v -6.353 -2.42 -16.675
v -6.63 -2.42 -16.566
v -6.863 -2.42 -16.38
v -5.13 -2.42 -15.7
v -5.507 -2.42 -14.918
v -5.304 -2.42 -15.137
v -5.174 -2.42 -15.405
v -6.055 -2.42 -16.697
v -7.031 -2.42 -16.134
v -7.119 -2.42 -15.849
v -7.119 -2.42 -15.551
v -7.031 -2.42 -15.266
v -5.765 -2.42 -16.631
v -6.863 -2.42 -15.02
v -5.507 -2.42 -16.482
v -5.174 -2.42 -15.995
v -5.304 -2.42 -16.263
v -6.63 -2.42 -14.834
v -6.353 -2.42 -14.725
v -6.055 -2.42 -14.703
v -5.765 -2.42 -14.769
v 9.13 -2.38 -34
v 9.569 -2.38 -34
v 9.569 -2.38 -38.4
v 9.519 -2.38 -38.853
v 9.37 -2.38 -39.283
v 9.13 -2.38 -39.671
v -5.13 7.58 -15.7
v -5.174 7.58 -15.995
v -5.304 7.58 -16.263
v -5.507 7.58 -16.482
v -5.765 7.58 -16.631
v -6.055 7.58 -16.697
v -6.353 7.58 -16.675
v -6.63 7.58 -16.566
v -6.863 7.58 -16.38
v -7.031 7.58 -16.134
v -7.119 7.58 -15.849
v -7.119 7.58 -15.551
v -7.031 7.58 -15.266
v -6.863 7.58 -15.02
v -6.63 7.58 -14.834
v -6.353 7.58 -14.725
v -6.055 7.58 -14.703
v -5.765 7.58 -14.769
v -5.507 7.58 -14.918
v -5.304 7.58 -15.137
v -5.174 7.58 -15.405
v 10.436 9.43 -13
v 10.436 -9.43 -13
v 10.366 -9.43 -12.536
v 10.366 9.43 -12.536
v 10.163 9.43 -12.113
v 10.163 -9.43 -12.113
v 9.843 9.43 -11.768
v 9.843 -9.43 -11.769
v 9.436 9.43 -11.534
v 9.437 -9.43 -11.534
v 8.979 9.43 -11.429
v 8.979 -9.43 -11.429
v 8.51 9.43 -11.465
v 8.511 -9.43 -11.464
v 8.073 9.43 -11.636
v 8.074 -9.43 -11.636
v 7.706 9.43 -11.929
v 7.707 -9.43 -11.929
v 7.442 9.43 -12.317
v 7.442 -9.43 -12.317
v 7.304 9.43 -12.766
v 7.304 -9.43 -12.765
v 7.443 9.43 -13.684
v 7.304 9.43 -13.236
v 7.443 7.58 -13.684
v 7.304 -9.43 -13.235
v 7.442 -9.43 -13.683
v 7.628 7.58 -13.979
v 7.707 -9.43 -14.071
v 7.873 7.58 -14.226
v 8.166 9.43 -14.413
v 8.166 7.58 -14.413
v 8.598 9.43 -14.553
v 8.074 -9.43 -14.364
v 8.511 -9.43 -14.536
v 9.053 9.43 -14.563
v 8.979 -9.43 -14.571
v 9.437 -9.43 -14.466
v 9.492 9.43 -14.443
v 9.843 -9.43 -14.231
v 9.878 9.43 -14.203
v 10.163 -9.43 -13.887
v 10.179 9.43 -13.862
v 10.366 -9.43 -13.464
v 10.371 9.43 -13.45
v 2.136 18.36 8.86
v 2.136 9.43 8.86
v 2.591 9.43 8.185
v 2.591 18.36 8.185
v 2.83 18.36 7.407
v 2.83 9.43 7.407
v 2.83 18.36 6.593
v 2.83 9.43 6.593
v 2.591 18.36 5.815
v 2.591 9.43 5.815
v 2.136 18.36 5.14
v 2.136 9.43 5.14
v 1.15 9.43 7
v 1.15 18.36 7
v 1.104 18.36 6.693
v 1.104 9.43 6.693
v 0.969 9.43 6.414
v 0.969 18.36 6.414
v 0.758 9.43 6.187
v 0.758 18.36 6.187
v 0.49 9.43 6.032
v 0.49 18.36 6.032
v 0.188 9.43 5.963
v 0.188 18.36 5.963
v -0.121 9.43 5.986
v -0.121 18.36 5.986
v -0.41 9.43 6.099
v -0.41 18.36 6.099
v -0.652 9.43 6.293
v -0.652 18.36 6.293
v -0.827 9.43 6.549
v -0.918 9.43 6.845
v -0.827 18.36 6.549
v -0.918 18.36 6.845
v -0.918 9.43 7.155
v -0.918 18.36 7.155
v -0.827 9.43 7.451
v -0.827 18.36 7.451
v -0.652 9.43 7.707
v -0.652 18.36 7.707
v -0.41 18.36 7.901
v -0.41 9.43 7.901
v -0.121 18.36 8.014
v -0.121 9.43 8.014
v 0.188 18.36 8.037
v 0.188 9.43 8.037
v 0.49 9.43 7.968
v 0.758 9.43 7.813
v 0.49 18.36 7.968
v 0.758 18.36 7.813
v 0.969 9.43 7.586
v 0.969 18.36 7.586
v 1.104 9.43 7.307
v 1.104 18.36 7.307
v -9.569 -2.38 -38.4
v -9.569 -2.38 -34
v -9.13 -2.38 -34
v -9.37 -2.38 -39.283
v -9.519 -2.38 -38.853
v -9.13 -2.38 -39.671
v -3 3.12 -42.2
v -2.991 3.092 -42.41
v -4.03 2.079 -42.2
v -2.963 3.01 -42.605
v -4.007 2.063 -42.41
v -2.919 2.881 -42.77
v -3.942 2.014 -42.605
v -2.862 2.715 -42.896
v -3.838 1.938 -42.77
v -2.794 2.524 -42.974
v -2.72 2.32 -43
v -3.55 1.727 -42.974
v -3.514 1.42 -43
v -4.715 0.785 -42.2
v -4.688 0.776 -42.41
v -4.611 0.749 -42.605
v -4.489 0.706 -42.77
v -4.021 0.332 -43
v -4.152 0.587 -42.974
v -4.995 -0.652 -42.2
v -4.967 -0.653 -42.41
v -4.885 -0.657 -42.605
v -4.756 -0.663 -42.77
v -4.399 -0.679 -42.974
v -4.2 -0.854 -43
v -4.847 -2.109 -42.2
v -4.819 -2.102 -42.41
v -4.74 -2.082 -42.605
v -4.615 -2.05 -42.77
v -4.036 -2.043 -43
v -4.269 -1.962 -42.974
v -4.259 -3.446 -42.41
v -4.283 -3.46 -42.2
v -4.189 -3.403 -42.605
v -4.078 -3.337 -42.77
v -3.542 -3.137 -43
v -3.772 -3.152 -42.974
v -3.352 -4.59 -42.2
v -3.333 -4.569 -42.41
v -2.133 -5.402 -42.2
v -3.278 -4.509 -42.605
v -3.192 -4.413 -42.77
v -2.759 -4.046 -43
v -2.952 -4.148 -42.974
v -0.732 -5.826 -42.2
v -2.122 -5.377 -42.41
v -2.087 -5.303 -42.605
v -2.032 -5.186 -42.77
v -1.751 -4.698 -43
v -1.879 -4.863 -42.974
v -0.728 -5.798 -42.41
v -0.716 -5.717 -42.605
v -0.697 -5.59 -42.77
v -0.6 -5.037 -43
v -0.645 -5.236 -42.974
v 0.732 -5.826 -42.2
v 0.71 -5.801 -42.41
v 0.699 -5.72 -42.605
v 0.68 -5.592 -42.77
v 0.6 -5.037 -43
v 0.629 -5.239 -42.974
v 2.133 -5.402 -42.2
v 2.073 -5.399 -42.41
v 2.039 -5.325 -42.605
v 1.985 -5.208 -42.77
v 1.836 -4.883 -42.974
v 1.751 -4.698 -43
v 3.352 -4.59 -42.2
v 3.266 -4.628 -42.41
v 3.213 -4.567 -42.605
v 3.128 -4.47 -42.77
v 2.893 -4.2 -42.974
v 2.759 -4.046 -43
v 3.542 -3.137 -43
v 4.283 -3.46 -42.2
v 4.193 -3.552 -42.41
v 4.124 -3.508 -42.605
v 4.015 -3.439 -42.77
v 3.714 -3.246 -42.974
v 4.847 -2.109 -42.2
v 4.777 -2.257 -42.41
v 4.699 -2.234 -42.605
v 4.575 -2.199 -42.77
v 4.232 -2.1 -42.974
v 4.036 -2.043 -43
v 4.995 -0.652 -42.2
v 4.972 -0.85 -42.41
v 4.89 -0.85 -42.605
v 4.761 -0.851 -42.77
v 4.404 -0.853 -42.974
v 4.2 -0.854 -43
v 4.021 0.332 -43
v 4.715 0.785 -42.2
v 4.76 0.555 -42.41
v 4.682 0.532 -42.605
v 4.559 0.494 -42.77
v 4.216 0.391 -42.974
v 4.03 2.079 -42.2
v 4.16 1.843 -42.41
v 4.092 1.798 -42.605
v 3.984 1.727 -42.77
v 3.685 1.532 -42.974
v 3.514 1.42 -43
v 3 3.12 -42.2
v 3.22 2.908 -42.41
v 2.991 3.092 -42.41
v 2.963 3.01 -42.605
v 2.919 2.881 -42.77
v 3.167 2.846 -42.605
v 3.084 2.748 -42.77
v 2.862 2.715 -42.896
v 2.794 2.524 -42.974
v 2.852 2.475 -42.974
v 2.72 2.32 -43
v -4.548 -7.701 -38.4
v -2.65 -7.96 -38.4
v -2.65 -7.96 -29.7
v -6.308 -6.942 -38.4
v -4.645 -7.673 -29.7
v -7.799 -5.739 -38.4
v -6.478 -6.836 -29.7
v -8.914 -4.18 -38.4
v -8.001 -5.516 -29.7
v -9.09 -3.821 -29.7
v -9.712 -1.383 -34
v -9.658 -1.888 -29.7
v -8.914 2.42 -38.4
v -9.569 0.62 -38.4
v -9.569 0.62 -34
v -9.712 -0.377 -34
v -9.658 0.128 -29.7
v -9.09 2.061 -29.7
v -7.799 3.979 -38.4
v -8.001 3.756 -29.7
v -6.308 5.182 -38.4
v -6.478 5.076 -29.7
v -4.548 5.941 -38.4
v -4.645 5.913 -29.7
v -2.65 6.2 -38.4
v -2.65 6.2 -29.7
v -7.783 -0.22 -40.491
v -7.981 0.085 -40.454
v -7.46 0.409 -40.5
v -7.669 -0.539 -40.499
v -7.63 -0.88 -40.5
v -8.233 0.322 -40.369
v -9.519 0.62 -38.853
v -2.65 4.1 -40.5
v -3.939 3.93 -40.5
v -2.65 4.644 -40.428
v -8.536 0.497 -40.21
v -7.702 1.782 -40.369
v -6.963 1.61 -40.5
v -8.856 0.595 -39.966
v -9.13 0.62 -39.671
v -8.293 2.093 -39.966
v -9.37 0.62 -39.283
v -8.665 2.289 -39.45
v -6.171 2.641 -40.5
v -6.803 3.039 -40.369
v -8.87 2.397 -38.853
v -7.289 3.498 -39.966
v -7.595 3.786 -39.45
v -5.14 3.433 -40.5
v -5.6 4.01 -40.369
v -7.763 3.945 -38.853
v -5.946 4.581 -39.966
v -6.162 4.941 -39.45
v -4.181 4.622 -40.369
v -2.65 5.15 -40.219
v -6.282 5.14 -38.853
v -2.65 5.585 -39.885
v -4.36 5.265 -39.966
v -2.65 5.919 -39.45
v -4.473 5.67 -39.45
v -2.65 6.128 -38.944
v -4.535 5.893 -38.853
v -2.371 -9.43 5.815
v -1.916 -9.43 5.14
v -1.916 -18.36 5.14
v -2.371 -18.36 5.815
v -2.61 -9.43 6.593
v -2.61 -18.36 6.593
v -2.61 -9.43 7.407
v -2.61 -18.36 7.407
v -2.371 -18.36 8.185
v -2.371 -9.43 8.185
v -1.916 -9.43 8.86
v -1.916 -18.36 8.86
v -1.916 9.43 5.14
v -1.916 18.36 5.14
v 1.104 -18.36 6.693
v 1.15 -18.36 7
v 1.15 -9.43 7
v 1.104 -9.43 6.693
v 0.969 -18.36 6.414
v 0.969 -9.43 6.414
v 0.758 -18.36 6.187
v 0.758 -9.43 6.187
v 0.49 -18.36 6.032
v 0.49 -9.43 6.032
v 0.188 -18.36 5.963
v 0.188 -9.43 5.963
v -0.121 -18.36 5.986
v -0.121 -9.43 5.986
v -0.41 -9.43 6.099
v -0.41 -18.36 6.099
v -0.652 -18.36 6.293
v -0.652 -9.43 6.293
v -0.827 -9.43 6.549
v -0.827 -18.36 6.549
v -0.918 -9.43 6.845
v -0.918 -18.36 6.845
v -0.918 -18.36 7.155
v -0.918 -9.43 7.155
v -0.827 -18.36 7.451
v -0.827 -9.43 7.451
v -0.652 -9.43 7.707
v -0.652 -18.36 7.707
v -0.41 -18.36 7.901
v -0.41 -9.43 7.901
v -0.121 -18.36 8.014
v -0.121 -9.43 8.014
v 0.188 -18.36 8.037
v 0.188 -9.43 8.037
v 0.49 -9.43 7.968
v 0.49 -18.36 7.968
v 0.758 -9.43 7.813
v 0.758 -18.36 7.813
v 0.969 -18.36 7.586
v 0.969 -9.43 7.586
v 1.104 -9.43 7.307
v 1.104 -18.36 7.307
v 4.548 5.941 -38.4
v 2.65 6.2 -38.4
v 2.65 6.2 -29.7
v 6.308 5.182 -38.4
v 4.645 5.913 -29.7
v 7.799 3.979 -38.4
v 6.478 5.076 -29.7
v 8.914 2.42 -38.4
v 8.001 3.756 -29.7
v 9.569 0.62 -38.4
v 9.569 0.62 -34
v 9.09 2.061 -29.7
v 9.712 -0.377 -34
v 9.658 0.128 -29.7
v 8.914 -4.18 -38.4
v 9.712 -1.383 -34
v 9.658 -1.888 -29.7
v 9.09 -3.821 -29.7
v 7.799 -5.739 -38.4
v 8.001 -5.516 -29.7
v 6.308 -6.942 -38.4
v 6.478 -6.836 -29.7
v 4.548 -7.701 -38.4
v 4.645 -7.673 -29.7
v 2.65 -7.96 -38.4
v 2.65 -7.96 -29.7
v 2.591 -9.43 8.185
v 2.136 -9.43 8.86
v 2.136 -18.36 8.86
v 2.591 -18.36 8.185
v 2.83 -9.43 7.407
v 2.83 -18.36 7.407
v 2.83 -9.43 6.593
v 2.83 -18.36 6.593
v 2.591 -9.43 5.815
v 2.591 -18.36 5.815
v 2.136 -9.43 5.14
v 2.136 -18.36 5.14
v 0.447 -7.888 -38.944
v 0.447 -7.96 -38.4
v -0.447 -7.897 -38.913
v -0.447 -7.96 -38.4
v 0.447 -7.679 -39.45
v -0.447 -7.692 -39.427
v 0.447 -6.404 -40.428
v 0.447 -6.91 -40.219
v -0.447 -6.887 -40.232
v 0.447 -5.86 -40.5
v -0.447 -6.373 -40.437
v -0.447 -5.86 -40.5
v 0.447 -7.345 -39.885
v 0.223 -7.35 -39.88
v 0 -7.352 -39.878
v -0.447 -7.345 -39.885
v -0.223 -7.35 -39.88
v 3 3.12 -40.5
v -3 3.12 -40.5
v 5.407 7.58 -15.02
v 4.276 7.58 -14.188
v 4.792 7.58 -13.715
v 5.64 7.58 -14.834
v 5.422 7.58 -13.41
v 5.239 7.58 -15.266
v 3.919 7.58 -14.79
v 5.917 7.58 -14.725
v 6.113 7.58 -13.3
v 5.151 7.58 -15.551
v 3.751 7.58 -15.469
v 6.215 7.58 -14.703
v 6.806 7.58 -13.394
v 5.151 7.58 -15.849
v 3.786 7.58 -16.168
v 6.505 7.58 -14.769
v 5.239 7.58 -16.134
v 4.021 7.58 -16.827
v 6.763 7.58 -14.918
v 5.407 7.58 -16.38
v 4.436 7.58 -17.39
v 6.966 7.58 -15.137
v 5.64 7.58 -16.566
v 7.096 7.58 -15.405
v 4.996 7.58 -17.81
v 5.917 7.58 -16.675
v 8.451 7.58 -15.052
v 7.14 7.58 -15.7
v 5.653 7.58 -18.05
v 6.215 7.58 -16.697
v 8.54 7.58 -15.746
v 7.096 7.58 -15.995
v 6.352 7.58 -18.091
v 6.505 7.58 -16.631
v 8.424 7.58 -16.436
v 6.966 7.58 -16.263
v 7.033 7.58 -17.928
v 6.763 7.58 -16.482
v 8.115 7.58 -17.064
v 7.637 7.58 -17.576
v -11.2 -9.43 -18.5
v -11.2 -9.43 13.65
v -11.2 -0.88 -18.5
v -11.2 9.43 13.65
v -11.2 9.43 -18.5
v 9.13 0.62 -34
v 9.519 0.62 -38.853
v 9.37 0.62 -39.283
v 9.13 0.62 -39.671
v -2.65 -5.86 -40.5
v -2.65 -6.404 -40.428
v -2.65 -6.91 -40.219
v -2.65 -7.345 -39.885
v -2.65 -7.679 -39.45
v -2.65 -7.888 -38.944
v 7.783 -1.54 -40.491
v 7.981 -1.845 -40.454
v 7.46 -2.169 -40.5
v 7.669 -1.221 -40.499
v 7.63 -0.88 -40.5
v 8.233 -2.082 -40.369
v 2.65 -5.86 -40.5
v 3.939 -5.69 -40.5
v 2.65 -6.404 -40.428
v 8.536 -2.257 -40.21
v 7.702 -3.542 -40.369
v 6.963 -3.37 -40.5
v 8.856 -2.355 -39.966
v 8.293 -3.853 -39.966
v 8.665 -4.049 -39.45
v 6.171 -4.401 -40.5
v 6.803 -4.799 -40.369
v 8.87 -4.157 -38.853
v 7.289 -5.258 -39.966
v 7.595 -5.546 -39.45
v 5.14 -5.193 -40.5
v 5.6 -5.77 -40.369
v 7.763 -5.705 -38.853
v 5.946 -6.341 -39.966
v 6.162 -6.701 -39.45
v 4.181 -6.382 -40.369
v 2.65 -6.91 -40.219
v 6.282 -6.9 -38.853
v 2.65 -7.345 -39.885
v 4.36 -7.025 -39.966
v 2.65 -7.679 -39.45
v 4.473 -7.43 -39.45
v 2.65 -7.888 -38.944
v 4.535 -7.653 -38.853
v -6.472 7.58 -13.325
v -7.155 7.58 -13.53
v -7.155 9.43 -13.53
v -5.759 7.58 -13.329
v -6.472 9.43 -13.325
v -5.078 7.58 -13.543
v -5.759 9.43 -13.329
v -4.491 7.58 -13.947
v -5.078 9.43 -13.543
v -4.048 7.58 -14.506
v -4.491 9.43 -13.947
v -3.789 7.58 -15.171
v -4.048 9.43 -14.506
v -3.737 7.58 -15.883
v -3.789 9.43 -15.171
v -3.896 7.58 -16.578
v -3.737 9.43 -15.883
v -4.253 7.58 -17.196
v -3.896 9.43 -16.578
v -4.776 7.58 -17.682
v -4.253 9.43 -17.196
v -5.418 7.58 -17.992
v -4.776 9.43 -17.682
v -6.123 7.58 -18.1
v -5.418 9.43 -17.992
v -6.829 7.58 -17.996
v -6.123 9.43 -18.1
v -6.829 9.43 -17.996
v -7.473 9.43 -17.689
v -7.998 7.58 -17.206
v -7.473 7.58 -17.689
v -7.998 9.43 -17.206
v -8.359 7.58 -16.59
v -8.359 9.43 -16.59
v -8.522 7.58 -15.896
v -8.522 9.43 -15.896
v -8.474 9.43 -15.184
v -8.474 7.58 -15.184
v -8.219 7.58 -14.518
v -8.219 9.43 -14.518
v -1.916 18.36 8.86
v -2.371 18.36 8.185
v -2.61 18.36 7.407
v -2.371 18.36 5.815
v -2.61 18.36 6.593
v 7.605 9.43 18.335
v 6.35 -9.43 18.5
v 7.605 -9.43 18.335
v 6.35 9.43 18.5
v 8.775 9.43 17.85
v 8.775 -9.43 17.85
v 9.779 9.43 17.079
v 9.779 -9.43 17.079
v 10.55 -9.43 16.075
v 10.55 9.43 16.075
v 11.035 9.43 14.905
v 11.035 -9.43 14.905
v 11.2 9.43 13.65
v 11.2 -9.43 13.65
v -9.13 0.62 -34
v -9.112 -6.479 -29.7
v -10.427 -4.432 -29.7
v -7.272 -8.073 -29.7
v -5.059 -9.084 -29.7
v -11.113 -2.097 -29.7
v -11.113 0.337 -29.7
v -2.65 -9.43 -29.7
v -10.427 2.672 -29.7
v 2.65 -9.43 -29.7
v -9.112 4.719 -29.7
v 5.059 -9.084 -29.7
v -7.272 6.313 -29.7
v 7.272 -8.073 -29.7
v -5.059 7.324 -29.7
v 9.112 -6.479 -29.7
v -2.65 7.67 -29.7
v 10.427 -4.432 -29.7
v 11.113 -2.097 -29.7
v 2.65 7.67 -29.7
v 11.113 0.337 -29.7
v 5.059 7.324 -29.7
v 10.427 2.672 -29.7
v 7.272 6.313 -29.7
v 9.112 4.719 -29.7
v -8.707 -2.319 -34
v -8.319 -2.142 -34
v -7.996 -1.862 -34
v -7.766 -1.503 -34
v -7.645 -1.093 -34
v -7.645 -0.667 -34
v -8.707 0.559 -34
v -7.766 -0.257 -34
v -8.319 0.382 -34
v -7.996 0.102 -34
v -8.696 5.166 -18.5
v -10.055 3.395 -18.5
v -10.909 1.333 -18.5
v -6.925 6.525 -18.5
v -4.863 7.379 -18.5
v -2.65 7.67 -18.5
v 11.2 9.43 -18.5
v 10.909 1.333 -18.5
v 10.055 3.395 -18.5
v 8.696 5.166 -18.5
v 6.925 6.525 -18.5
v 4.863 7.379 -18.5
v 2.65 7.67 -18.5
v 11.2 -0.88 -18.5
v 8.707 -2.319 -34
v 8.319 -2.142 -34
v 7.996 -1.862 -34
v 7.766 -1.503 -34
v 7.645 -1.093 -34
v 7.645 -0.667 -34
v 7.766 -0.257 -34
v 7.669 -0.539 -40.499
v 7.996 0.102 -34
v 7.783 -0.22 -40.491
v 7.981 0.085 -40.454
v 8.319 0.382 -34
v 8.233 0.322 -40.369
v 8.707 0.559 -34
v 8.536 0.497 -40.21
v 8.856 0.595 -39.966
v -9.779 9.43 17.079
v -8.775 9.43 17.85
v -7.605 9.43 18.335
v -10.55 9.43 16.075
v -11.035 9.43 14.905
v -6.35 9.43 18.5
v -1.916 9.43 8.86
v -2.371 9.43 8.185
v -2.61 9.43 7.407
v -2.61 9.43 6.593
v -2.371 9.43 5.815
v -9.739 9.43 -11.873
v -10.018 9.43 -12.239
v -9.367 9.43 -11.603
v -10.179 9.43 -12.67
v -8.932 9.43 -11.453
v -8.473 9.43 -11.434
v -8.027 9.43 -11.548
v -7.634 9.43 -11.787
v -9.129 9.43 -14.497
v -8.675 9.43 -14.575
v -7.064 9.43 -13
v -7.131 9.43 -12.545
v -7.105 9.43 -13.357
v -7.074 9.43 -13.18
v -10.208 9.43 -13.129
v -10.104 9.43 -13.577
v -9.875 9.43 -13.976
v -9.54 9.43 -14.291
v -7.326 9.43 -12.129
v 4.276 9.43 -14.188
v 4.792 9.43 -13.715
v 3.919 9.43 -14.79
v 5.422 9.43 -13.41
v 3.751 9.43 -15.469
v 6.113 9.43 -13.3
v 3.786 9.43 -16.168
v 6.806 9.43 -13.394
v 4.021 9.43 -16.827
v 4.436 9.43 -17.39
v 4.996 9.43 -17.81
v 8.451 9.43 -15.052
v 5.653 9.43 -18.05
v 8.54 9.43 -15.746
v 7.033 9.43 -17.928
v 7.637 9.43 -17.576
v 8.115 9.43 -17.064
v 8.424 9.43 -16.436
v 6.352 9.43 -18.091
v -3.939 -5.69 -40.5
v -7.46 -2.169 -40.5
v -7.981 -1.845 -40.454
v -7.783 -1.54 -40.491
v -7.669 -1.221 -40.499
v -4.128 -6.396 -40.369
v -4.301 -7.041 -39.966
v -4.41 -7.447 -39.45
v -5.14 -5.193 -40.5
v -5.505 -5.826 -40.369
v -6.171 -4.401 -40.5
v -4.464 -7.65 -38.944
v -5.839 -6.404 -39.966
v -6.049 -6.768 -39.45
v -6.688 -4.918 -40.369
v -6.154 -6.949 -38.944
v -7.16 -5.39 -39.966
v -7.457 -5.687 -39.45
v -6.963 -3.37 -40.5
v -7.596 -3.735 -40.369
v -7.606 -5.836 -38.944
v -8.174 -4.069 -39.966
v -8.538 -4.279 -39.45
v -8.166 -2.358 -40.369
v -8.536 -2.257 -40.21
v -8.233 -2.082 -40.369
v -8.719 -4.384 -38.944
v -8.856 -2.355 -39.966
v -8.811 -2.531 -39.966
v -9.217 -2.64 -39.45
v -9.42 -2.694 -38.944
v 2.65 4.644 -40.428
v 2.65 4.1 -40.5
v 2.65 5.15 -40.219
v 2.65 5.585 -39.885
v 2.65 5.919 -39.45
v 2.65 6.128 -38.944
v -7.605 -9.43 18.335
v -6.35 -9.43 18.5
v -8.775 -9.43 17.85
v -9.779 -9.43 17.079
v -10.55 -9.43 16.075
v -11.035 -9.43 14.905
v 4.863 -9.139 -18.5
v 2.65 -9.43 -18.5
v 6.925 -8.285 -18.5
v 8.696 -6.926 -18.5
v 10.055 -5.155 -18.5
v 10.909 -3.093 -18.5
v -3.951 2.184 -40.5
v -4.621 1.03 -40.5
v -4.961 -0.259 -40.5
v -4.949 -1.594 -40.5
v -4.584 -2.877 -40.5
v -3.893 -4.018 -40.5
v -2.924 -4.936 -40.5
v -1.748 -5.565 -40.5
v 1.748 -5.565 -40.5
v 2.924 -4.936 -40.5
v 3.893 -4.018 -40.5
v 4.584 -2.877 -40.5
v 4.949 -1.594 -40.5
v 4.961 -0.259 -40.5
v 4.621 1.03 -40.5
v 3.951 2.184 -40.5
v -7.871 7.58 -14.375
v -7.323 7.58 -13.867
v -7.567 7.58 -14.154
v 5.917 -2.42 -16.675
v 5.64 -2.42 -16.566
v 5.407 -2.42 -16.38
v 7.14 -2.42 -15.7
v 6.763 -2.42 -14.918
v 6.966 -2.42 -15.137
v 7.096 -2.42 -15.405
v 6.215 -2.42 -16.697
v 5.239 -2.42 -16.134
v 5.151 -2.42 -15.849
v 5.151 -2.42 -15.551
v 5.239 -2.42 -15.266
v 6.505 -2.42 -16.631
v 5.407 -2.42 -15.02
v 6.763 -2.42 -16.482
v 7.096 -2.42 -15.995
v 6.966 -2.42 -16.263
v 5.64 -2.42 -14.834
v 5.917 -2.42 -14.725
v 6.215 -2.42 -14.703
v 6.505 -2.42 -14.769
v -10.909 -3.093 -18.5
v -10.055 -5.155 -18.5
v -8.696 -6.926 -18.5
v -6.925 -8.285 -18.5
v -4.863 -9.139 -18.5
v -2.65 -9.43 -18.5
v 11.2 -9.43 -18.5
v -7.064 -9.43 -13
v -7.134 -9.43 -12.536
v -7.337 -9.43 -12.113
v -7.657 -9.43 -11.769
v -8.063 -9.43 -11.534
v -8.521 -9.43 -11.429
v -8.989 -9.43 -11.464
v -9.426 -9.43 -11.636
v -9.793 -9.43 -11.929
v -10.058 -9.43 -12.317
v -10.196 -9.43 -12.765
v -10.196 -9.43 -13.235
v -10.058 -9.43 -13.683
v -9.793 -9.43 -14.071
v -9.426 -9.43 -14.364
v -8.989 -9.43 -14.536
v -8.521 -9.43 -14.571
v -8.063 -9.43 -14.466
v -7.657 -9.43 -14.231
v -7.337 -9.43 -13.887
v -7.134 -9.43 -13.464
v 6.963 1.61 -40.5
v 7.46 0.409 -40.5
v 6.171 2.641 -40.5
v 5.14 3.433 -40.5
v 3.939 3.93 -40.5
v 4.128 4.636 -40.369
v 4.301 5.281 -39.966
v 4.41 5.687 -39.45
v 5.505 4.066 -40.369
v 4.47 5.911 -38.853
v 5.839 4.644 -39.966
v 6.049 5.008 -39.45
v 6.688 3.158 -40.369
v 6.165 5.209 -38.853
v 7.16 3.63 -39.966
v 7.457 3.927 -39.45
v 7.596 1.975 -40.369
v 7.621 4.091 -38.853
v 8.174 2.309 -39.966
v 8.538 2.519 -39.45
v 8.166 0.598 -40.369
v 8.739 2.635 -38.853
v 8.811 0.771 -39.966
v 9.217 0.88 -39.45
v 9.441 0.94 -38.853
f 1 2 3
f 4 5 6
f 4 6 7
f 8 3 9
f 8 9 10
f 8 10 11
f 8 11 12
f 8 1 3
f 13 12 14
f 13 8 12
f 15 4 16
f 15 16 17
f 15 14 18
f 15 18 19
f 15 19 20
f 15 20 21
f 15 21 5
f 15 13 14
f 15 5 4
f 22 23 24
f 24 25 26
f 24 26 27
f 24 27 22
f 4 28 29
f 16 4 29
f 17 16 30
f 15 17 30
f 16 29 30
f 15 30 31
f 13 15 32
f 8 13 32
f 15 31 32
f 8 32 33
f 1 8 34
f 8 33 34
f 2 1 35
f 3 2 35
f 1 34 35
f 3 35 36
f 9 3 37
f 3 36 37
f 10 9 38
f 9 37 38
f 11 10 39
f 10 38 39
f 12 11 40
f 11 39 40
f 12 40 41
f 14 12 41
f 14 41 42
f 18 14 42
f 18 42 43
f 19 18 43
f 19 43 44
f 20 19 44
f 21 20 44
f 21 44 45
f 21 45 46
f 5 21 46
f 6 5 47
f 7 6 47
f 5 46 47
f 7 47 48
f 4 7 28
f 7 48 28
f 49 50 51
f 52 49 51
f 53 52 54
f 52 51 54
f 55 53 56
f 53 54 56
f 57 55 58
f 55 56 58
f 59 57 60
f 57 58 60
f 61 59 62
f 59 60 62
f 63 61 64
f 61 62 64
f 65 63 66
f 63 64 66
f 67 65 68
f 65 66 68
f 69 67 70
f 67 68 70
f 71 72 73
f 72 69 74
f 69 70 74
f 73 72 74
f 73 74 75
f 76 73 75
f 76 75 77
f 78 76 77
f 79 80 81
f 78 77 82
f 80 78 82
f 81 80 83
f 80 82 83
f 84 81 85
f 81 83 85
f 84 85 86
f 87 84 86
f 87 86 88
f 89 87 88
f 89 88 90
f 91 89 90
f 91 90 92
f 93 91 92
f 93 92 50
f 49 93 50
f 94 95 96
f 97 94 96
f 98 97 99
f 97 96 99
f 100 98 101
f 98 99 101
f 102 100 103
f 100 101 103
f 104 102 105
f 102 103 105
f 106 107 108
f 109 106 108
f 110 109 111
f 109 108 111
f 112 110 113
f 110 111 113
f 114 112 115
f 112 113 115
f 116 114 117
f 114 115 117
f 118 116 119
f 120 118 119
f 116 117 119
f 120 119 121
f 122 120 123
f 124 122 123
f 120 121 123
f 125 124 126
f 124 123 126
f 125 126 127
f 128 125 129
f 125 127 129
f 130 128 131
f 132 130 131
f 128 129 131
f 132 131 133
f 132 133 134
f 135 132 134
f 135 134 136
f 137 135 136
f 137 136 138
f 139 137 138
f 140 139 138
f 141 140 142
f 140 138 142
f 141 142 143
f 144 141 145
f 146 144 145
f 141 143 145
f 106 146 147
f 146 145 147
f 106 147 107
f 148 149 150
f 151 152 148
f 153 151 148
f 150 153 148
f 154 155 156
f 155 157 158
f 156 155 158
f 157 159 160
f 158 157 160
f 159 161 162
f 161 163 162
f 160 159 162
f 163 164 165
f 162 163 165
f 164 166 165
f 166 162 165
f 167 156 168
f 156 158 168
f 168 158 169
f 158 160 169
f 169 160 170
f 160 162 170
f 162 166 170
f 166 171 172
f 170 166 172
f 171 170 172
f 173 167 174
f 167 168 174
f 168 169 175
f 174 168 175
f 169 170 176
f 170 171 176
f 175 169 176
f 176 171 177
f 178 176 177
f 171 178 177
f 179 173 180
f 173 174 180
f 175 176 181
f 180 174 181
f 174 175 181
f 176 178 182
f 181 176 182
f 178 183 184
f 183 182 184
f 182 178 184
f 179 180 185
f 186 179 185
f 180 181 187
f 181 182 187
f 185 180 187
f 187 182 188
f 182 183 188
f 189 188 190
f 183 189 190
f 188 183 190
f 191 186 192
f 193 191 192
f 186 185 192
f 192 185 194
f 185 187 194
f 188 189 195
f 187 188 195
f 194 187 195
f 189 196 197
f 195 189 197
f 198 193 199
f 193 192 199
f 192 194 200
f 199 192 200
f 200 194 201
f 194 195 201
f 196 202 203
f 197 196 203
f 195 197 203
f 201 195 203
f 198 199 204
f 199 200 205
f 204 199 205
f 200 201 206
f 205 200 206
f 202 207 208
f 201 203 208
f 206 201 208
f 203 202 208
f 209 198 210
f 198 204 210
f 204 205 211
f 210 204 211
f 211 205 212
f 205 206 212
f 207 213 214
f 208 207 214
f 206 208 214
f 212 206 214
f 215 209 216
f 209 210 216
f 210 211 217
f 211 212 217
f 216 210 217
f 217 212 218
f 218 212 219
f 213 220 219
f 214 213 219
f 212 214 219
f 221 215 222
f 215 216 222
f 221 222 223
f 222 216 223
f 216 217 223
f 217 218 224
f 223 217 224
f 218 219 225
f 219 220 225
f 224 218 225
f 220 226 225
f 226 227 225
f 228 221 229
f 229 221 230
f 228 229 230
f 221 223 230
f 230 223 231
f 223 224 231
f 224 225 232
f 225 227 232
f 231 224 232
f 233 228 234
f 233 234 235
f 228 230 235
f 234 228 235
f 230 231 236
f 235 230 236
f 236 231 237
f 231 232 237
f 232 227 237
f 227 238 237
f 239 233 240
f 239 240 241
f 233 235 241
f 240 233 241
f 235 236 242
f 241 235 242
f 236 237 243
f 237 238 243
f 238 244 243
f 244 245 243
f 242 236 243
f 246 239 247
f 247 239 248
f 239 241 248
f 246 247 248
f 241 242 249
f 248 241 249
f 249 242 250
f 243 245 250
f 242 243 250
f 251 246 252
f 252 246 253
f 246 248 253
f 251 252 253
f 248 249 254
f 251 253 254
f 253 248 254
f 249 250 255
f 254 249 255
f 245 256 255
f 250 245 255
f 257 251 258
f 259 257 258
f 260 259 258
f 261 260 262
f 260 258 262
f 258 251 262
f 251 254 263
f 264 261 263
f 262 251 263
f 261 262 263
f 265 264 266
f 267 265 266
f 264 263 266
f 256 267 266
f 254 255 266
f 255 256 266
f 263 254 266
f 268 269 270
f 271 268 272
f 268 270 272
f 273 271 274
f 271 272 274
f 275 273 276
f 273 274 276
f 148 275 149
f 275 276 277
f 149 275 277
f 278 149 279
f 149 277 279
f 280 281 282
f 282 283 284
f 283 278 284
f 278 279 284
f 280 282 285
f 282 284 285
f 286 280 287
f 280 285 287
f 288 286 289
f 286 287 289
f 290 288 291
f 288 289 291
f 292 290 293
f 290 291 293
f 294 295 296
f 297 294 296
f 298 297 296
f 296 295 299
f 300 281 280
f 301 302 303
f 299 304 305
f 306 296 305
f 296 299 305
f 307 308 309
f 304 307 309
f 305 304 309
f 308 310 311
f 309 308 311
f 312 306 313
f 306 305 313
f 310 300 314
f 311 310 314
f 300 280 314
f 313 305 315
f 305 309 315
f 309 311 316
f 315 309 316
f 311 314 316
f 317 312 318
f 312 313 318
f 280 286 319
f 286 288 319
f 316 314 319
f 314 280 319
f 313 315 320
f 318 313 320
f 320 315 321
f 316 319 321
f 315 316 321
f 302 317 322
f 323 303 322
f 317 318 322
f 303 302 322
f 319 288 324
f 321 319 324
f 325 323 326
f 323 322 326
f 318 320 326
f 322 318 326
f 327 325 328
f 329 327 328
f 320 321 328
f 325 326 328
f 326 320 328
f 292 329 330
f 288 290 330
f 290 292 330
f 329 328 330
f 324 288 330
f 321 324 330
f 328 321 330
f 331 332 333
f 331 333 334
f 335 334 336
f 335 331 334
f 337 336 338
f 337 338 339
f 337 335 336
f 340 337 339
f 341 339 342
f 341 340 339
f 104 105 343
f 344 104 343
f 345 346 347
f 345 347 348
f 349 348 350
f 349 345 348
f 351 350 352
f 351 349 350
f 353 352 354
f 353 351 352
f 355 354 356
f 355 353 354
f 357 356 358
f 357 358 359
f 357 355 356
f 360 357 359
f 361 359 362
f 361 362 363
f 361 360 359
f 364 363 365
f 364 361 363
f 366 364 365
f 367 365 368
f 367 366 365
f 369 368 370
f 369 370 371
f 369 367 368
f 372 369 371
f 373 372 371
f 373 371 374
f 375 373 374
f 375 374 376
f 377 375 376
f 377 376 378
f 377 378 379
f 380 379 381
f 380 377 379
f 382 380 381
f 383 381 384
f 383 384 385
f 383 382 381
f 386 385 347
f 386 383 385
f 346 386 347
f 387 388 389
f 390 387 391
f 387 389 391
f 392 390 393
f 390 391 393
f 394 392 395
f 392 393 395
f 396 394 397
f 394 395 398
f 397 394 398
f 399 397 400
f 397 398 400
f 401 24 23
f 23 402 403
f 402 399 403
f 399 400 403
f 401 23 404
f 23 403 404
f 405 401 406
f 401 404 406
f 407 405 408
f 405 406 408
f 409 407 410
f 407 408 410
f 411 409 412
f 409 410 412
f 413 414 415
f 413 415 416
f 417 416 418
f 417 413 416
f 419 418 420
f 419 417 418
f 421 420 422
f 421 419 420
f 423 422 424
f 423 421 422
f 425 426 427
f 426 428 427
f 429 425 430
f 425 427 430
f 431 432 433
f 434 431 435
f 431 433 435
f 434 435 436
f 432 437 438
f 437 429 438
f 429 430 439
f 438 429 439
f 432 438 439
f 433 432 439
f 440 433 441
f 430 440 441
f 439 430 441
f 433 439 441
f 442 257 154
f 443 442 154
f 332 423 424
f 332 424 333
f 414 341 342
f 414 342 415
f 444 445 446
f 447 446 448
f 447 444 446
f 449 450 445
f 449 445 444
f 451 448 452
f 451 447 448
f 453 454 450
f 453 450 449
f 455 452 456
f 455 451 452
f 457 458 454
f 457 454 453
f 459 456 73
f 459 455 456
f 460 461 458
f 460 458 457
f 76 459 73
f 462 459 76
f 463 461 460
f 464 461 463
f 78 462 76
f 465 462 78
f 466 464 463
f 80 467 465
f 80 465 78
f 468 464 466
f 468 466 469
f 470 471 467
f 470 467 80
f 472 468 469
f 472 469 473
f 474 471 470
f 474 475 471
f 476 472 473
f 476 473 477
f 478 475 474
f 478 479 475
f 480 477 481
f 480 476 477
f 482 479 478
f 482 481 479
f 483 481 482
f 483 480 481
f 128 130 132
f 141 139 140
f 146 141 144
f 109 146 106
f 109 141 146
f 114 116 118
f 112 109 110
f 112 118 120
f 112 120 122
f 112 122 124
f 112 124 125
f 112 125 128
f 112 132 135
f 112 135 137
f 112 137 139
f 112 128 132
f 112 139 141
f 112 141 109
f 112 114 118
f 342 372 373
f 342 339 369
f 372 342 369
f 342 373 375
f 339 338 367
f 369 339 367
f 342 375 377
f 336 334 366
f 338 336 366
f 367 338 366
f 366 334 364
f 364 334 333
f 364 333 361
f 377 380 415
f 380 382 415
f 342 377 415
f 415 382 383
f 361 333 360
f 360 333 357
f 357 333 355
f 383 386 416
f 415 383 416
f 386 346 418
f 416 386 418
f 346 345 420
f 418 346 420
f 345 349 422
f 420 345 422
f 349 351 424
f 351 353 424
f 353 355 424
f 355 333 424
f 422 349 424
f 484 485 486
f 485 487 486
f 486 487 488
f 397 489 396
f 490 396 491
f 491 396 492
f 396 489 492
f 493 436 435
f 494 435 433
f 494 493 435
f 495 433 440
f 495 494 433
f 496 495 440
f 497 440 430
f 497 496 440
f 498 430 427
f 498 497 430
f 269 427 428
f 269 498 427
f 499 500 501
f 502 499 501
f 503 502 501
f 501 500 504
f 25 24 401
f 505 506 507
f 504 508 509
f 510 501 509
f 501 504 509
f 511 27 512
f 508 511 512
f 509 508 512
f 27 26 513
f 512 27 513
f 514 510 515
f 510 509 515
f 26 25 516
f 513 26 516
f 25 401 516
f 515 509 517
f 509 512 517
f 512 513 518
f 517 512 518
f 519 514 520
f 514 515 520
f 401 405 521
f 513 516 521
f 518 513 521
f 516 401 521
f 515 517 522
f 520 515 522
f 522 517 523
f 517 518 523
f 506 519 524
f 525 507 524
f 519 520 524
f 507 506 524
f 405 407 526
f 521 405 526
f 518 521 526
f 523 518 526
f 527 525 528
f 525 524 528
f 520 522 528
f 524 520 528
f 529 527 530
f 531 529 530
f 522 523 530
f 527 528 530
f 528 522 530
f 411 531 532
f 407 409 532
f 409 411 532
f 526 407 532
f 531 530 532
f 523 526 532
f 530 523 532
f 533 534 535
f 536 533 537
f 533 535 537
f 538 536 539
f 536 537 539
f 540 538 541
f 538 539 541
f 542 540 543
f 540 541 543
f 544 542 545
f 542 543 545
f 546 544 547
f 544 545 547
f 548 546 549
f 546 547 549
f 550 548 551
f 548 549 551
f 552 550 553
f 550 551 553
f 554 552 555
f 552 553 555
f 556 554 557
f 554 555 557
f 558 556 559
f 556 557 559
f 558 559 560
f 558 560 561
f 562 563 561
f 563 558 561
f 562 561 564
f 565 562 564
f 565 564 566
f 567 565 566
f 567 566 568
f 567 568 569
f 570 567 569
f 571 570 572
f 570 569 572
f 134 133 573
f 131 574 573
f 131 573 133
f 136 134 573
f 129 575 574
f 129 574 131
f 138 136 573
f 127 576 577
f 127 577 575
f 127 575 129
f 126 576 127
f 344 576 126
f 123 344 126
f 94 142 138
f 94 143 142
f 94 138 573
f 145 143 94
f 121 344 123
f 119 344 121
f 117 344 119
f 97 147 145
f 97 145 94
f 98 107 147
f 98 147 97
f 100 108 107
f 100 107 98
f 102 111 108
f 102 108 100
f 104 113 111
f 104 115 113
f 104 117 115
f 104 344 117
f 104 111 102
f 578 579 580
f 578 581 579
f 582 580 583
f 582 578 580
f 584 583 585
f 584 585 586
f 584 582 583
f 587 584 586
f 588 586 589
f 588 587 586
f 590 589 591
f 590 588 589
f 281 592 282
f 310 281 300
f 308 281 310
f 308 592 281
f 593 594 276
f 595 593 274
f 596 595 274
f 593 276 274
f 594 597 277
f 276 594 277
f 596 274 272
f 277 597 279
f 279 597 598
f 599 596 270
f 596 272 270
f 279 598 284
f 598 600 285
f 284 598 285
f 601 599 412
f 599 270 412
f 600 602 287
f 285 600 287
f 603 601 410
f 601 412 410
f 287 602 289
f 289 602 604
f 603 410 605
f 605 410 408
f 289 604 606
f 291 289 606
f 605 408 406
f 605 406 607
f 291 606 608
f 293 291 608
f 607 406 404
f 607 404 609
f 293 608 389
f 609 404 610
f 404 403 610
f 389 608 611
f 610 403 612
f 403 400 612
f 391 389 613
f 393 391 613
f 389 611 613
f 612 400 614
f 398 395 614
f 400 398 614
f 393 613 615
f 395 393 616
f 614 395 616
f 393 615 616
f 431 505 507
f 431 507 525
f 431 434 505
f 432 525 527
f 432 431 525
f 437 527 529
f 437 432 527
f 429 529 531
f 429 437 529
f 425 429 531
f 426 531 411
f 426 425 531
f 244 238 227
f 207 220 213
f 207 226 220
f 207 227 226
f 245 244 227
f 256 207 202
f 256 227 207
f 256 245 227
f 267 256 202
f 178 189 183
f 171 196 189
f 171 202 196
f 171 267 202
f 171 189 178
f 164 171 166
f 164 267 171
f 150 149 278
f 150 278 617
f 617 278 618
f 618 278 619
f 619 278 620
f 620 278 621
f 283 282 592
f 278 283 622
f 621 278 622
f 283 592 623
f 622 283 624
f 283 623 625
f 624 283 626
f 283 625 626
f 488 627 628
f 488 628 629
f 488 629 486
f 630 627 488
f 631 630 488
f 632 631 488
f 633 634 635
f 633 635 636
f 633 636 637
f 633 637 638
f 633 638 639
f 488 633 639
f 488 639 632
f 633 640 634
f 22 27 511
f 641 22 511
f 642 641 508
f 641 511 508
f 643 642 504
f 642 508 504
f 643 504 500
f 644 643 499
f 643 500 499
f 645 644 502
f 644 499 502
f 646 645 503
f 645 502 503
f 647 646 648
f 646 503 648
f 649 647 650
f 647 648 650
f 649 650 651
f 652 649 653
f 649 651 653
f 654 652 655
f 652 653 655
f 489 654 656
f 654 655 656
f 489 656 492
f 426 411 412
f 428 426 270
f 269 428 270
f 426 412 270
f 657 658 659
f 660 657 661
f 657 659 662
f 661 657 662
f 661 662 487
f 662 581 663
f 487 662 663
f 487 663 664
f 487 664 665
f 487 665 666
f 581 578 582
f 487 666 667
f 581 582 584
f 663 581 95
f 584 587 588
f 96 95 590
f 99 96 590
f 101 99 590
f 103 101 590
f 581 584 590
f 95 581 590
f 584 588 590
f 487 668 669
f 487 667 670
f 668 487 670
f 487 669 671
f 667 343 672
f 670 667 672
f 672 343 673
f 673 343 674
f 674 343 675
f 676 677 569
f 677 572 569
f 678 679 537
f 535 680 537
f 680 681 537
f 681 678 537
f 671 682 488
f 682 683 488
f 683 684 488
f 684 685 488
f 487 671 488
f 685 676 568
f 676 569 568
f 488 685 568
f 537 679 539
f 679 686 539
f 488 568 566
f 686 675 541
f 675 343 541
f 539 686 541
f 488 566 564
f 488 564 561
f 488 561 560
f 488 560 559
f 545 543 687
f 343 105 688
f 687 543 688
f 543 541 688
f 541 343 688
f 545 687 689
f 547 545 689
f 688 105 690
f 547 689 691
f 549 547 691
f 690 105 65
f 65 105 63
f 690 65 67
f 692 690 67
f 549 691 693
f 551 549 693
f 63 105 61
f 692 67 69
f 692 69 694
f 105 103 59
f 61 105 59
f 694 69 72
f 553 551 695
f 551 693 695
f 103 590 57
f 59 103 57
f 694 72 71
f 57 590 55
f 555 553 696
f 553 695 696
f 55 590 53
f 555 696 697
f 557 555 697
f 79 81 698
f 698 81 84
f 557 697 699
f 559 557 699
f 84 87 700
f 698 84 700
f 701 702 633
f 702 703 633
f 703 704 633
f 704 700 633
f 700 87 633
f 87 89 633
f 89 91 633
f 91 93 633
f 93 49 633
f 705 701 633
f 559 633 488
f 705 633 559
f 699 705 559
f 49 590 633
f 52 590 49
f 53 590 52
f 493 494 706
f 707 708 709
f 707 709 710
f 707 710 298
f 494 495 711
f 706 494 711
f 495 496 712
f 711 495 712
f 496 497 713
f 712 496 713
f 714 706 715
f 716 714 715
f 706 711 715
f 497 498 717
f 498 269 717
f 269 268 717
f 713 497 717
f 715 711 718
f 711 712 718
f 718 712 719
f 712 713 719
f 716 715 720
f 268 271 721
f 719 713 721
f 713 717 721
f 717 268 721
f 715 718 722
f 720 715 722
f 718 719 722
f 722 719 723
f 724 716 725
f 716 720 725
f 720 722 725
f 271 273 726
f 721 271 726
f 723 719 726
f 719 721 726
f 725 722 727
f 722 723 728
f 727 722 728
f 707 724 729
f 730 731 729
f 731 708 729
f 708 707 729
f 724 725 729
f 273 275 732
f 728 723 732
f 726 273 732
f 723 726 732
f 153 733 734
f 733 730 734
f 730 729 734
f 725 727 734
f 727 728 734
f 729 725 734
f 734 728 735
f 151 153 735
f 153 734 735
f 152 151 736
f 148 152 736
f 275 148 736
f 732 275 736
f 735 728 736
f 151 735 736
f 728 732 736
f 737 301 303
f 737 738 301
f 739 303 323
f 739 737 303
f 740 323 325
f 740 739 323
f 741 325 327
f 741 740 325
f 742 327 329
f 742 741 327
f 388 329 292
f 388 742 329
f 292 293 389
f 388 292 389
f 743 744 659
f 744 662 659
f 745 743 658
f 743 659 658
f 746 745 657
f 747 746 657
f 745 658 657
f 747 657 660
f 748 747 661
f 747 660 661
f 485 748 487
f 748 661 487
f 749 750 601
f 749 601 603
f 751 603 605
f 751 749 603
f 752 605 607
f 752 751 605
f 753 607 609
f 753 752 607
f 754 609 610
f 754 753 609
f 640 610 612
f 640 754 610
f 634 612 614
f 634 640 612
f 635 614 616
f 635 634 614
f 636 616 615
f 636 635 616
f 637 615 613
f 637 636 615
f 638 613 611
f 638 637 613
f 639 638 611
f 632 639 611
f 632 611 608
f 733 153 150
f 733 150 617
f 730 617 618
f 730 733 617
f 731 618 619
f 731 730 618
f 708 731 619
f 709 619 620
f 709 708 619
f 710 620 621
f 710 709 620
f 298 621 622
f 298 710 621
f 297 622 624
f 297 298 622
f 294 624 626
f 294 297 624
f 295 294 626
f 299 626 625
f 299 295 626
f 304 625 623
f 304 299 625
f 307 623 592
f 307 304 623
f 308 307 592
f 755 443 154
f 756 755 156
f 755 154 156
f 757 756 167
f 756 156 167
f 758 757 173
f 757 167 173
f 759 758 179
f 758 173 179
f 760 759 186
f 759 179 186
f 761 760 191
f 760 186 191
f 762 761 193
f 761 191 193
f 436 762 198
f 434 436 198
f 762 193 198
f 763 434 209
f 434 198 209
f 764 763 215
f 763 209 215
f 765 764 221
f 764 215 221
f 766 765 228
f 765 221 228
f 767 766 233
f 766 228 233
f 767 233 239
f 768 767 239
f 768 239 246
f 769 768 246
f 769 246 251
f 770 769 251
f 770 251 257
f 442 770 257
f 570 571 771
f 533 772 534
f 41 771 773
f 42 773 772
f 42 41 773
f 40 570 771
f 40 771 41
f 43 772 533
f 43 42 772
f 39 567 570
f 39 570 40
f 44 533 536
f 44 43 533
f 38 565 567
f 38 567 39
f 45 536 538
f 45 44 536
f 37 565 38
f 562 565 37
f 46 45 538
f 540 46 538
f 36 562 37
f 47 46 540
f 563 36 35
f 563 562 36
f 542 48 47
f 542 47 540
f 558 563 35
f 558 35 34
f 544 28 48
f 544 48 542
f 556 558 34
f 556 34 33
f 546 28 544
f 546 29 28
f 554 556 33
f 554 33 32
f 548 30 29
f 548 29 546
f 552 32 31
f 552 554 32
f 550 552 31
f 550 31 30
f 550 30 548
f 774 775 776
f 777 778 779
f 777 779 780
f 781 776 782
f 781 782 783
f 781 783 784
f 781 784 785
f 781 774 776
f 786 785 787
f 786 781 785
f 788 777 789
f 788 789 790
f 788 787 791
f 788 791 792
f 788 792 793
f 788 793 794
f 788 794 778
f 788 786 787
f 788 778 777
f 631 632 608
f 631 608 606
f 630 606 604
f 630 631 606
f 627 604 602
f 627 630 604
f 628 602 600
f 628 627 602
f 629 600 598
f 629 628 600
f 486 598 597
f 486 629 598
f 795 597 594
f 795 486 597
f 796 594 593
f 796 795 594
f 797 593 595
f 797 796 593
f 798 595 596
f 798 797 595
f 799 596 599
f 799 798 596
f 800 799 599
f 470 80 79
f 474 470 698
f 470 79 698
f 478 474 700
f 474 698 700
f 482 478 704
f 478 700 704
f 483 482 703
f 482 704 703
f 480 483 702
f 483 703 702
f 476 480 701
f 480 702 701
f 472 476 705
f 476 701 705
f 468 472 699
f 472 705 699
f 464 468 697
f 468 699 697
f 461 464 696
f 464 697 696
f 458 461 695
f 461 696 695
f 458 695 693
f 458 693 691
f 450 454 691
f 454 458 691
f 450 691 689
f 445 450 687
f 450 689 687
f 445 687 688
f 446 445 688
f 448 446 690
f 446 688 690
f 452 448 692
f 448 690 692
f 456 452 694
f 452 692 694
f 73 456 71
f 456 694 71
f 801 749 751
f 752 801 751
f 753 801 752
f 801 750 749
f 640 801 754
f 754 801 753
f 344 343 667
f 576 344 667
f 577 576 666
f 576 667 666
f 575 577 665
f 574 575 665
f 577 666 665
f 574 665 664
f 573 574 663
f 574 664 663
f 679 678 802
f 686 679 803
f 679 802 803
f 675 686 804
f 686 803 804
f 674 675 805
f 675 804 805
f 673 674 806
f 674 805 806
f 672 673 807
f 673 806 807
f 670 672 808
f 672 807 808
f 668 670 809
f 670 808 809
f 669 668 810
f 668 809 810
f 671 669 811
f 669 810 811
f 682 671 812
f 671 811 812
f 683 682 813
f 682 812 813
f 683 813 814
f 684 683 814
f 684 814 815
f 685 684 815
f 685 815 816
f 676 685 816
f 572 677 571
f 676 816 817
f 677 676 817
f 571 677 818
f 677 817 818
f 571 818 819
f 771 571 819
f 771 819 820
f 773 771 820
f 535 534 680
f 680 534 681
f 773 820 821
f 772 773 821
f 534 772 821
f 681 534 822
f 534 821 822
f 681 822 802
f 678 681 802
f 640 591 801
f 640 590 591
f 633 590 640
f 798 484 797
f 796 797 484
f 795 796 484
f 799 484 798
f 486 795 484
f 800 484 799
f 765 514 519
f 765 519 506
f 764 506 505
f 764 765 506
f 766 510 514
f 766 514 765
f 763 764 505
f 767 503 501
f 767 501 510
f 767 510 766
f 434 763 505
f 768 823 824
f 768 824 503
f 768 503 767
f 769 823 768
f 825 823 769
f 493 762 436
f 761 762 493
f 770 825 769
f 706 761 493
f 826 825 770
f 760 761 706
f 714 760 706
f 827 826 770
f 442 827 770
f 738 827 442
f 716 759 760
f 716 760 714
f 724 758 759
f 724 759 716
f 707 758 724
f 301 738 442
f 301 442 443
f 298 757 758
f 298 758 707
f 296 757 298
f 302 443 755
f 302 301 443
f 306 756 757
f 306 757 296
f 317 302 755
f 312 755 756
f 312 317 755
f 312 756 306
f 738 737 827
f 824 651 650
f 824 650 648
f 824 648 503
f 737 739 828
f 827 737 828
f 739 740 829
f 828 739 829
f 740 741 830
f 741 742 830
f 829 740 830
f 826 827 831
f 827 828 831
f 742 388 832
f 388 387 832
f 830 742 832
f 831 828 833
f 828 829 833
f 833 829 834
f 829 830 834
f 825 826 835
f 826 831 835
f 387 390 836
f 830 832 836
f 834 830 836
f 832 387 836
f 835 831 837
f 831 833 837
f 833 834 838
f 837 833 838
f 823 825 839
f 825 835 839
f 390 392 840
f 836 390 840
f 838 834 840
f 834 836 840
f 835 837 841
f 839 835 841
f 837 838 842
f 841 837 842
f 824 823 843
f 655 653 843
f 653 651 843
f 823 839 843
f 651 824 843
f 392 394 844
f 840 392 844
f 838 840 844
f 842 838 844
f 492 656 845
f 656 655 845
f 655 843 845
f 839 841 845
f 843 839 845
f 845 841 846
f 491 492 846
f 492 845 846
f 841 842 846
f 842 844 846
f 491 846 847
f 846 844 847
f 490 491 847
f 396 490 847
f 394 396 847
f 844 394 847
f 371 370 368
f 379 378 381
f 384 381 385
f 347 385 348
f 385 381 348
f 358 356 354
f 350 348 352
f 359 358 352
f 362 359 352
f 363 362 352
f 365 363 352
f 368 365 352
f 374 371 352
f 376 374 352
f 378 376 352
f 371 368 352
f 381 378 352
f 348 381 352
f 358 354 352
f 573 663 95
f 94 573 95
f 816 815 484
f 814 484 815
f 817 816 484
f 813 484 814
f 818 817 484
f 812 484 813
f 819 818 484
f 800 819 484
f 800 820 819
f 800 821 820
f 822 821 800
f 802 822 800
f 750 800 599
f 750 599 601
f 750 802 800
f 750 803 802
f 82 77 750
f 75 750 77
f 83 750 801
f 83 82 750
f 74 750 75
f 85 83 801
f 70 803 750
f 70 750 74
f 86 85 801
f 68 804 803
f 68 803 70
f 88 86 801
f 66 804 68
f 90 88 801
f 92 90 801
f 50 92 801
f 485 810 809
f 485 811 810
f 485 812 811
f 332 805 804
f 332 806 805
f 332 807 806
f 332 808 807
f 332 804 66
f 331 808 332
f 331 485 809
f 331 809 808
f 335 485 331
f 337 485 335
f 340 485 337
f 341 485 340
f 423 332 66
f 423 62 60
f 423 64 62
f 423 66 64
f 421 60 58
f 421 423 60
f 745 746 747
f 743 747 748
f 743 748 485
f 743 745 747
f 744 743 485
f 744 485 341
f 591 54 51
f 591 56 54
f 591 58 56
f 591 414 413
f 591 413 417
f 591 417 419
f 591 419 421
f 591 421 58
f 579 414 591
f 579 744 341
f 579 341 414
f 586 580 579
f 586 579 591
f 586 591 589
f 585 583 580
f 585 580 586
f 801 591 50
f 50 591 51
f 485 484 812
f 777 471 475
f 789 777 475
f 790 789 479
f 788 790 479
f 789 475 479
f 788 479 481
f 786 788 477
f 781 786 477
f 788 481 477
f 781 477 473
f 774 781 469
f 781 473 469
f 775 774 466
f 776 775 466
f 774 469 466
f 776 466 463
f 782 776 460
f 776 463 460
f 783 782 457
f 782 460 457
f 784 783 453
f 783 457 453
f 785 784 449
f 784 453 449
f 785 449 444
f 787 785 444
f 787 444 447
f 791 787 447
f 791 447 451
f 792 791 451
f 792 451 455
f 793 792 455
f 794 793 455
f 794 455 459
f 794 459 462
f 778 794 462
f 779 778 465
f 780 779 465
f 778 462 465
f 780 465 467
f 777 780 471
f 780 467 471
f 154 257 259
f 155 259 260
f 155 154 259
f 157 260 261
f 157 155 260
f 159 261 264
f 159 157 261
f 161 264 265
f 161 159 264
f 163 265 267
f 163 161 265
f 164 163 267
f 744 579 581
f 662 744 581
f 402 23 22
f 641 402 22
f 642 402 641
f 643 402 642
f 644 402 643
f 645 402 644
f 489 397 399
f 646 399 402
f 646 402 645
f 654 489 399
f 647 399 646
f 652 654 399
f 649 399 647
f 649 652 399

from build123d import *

# Parameters (mm, degrees)
SKETCH2_W           = 37
SKETCH2_H           = 18.86
BOSS_EXTRUDE1_DEPTH = 11.2
FILLET1_R           = 4.85
BOSS_EXTRUDE2_DEPTH = 11.2
BOSS_EXTRUDE3_DEPTH = 13.3
CUT_EXTRUDE1_DEPTH  = 2.5
FILLET2_R           = 0.8
FILLET3_R           = 2.1
CUT_EXTRUDE2_DEPTH  = 6.5
BOSS_EXTRUDE5_DEPTH = 8.93
SKETCH11_R          = 1.04
CUT_EXTRUDE4_DEPTH  = 8.93
CUT_EXTRUDE5_REACH  = 29.79
SKETCH12_R          = 1.575
SKETCH13_R          = 2.4
CUT_EXTRUDE6_DEPTH  = 1.85
SKETCH14_R          = 1
CUT_EXTRUDE7_DEPTH  = 10


with BuildPart() as part:
    # Sketch2 → Boss-Extrude1 (new body, symmetric)
    with BuildSketch(Plane(origin=(0, 0, 0), x_dir=(0, 0, -1), z_dir=(1, 0, 0))):
        Rectangle(SKETCH2_W, SKETCH2_H)
    extrude(amount=BOSS_EXTRUDE1_DEPTH, both=True)

    # Fillet1
    fillet1_edges = [part.edges().sort_by_distance(p)[0] for p in [
        (11.2, 0, 18.5),
        (-11.2, 0, 18.5),
    ]]
    fillet(fillet1_edges, radius=FILLET1_R)

    # Sketch3 → Boss-Extrude2 (add)
    with BuildSketch(Plane(origin=(0, 0, -18.5), x_dir=(-1, 0, 0), z_dir=(0, 0, -1))):
        with BuildLine():
            Line((-2.65, 7.67), (2.65, 7.67))
            ThreePointArc((2.65, 7.67), (11.2, -0.88), (2.65, -9.43))
            Line((2.65, -9.43), (-2.65, -9.43))
            ThreePointArc((-2.65, -9.43), (-11.2, -0.88), (-2.65, 7.67))
        make_face()
    extrude(amount=BOSS_EXTRUDE2_DEPTH)

    # Sketch4 → Boss-Extrude3 (add)
    with BuildSketch(Plane(origin=(0, 0, -29.7), x_dir=(-1, 0, 0), z_dir=(0, 0, -1))):
        with BuildLine():
            Line((-2.65, -7.96), (2.65, -7.96))
            ThreePointArc((2.65, -7.96), (9.73, -0.88), (2.65, 6.2))
            Line((2.65, 6.2), (-2.65, 6.2))
            ThreePointArc((-2.65, 6.2), (-9.73, -0.88), (-2.65, -7.96))
        make_face()
    extrude(amount=BOSS_EXTRUDE3_DEPTH)

    # Sketch5 → Cut-Extrude1 (cut)
    with BuildSketch(Plane(origin=(0, 0, -43), x_dir=(-1, 0, 0), z_dir=(0, 0, -1))):
        with BuildLine():
            Line((-2.65, -7.96), (2.65, -7.96))
            ThreePointArc((2.65, -7.96), (9.73, -0.88), (2.65, 6.2))
            Line((2.65, 6.2), (-2.65, 6.2))
            ThreePointArc((-2.65, 6.2), (-9.73, -0.88), (-2.65, -7.96))
        make_face()
        with BuildLine():
            Line((-3, 3.12), (3, 3.12))
            ThreePointArc((3, 3.12), (0, -5.88), (-3, 3.12))
        make_face(mode=Mode.SUBTRACT)
    extrude(amount=-CUT_EXTRUDE1_DEPTH, mode=Mode.SUBTRACT)

    # Fillet2
    fillet2_edges = [part.edges().sort_by_distance(p)[0] for p in [
        (0, -5.88, -43),
        (0, 3.12, -43),
    ]]
    fillet(fillet2_edges, radius=FILLET2_R)

    # Fillet3
    fillet3_edges = [part.edges().sort_by_distance(p)[0] for p in [
        (9.73, -0.88, -40.5),
        (0, 6.2, -40.5),
        (-9.73, -0.88, -40.5),
        (0, -7.96, -40.5),
    ]]
    fillet(fillet3_edges, radius=FILLET3_R)

    # Sketch6 → Cut-Extrude2 (cut)
    with BuildSketch(Plane(origin=(0, 0, -40.5), x_dir=(-1, 0, 0), z_dir=(0, 0, -1))):
        with BuildLine():
            Line((9.13, 0.62), (11.2, 0.62))
            ThreePointArc((11.2, 0.62), (12.7, -0.88), (11.2, -2.38))
            Line((11.2, -2.38), (9.13, -2.38))
            ThreePointArc((9.13, -2.38), (7.63, -0.88), (9.13, 0.62))
        make_face()
    cut_extrude2 = extrude(amount=-CUT_EXTRUDE2_DEPTH, mode=Mode.SUBTRACT)

    # Mirror1: Cut-Extrude2 across plane
    add(cut_extrude2.mirror(Plane(origin=(0, 0, 0), x_dir=(0, 0, 1), z_dir=(1, 0, 0))), mode=Mode.SUBTRACT)

    # Sketch10 → Boss-Extrude5 (add)
    with BuildSketch(Plane(origin=(0, 9.43, 0), x_dir=(1, 0, 0), z_dir=(0, 1, 0))):
        with BuildLine():
            Line((-1.915561651, -8.86), (2.135561651, -8.86))
            ThreePointArc((2.135561651, -8.86), (2.86, -7), (2.135561651, -5.14))
            Line((2.135561651, -5.14), (-1.915561651, -5.14))
            ThreePointArc((-1.915561651, -5.14), (-2.64, -7), (-1.915561651, -8.86))
        make_face()
    boss_extrude5 = extrude(amount=BOSS_EXTRUDE5_DEPTH)

    # Sketch11 → Cut-Extrude4 (cut)
    with BuildSketch(Plane(origin=(0, 18.36, 0), x_dir=(1, 0, 0), z_dir=(0, 1, 0))):
        with Locations((0.11, -7)):
            Circle(SKETCH11_R)
    cut_extrude4 = extrude(amount=-CUT_EXTRUDE4_DEPTH, mode=Mode.SUBTRACT)

    # Mirror3: Boss-Extrude5, Cut-Extrude4 across plane
    add(boss_extrude5.mirror(Plane.ZX))
    add(cut_extrude4.mirror(Plane.ZX), mode=Mode.SUBTRACT)

    # Sketch12 → Cut-Extrude5 (cut, up to next)
    with BuildSketch(Plane.XZ.offset(9.43), mode=Mode.PRIVATE) as cut_extrude5_sk1:
        with Locations((8.861437687, -13)):
            Circle(SKETCH12_R)
    cut_extrude5_tool1 = extrude(cut_extrude5_sk1.sketch, amount=-CUT_EXTRUDE5_REACH, mode=Mode.PRIVATE) & part.part
    add(cut_extrude5_tool1.solids().sort_by_distance((8.861438, -9.43, -13))[0], mode=Mode.SUBTRACT)
    # Sketch12 → Cut-Extrude5 (cut, up to next)
    with BuildSketch(Plane.XZ.offset(9.43), mode=Mode.PRIVATE) as cut_extrude5_sk2:
        with Locations((-8.638562313, -13)):
            Circle(SKETCH12_R)
    cut_extrude5_tool2 = extrude(cut_extrude5_sk2.sketch, amount=-CUT_EXTRUDE5_REACH, mode=Mode.PRIVATE) & part.part
    add(cut_extrude5_tool2.solids().sort_by_distance((-8.638562, -9.43, -13))[0], mode=Mode.SUBTRACT)

    # Sketch13 → Cut-Extrude6 (cut)
    with BuildSketch(Plane(origin=(0, 9.43, 0), x_dir=(1, 0, 0), z_dir=(0, 1, 0))):
        with Locations((6.14, 15.7)):
            Circle(SKETCH13_R)
        with Locations((-6.13, 15.7)):
            Circle(SKETCH13_R)
    extrude(amount=-CUT_EXTRUDE6_DEPTH, mode=Mode.SUBTRACT)

    # Sketch14 → Cut-Extrude7 (cut)
    with BuildSketch(Plane(origin=(0, 7.58, 0), x_dir=(1, 0, 0), z_dir=(0, 1, 0))):
        with Locations((-6.13, 15.7)):
            Circle(SKETCH14_R)
        with Locations((6.14, 15.7)):
            Circle(SKETCH14_R)
    extrude(amount=-CUT_EXTRUDE7_DEPTH, mode=Mode.SUBTRACT)


solid = part.part
